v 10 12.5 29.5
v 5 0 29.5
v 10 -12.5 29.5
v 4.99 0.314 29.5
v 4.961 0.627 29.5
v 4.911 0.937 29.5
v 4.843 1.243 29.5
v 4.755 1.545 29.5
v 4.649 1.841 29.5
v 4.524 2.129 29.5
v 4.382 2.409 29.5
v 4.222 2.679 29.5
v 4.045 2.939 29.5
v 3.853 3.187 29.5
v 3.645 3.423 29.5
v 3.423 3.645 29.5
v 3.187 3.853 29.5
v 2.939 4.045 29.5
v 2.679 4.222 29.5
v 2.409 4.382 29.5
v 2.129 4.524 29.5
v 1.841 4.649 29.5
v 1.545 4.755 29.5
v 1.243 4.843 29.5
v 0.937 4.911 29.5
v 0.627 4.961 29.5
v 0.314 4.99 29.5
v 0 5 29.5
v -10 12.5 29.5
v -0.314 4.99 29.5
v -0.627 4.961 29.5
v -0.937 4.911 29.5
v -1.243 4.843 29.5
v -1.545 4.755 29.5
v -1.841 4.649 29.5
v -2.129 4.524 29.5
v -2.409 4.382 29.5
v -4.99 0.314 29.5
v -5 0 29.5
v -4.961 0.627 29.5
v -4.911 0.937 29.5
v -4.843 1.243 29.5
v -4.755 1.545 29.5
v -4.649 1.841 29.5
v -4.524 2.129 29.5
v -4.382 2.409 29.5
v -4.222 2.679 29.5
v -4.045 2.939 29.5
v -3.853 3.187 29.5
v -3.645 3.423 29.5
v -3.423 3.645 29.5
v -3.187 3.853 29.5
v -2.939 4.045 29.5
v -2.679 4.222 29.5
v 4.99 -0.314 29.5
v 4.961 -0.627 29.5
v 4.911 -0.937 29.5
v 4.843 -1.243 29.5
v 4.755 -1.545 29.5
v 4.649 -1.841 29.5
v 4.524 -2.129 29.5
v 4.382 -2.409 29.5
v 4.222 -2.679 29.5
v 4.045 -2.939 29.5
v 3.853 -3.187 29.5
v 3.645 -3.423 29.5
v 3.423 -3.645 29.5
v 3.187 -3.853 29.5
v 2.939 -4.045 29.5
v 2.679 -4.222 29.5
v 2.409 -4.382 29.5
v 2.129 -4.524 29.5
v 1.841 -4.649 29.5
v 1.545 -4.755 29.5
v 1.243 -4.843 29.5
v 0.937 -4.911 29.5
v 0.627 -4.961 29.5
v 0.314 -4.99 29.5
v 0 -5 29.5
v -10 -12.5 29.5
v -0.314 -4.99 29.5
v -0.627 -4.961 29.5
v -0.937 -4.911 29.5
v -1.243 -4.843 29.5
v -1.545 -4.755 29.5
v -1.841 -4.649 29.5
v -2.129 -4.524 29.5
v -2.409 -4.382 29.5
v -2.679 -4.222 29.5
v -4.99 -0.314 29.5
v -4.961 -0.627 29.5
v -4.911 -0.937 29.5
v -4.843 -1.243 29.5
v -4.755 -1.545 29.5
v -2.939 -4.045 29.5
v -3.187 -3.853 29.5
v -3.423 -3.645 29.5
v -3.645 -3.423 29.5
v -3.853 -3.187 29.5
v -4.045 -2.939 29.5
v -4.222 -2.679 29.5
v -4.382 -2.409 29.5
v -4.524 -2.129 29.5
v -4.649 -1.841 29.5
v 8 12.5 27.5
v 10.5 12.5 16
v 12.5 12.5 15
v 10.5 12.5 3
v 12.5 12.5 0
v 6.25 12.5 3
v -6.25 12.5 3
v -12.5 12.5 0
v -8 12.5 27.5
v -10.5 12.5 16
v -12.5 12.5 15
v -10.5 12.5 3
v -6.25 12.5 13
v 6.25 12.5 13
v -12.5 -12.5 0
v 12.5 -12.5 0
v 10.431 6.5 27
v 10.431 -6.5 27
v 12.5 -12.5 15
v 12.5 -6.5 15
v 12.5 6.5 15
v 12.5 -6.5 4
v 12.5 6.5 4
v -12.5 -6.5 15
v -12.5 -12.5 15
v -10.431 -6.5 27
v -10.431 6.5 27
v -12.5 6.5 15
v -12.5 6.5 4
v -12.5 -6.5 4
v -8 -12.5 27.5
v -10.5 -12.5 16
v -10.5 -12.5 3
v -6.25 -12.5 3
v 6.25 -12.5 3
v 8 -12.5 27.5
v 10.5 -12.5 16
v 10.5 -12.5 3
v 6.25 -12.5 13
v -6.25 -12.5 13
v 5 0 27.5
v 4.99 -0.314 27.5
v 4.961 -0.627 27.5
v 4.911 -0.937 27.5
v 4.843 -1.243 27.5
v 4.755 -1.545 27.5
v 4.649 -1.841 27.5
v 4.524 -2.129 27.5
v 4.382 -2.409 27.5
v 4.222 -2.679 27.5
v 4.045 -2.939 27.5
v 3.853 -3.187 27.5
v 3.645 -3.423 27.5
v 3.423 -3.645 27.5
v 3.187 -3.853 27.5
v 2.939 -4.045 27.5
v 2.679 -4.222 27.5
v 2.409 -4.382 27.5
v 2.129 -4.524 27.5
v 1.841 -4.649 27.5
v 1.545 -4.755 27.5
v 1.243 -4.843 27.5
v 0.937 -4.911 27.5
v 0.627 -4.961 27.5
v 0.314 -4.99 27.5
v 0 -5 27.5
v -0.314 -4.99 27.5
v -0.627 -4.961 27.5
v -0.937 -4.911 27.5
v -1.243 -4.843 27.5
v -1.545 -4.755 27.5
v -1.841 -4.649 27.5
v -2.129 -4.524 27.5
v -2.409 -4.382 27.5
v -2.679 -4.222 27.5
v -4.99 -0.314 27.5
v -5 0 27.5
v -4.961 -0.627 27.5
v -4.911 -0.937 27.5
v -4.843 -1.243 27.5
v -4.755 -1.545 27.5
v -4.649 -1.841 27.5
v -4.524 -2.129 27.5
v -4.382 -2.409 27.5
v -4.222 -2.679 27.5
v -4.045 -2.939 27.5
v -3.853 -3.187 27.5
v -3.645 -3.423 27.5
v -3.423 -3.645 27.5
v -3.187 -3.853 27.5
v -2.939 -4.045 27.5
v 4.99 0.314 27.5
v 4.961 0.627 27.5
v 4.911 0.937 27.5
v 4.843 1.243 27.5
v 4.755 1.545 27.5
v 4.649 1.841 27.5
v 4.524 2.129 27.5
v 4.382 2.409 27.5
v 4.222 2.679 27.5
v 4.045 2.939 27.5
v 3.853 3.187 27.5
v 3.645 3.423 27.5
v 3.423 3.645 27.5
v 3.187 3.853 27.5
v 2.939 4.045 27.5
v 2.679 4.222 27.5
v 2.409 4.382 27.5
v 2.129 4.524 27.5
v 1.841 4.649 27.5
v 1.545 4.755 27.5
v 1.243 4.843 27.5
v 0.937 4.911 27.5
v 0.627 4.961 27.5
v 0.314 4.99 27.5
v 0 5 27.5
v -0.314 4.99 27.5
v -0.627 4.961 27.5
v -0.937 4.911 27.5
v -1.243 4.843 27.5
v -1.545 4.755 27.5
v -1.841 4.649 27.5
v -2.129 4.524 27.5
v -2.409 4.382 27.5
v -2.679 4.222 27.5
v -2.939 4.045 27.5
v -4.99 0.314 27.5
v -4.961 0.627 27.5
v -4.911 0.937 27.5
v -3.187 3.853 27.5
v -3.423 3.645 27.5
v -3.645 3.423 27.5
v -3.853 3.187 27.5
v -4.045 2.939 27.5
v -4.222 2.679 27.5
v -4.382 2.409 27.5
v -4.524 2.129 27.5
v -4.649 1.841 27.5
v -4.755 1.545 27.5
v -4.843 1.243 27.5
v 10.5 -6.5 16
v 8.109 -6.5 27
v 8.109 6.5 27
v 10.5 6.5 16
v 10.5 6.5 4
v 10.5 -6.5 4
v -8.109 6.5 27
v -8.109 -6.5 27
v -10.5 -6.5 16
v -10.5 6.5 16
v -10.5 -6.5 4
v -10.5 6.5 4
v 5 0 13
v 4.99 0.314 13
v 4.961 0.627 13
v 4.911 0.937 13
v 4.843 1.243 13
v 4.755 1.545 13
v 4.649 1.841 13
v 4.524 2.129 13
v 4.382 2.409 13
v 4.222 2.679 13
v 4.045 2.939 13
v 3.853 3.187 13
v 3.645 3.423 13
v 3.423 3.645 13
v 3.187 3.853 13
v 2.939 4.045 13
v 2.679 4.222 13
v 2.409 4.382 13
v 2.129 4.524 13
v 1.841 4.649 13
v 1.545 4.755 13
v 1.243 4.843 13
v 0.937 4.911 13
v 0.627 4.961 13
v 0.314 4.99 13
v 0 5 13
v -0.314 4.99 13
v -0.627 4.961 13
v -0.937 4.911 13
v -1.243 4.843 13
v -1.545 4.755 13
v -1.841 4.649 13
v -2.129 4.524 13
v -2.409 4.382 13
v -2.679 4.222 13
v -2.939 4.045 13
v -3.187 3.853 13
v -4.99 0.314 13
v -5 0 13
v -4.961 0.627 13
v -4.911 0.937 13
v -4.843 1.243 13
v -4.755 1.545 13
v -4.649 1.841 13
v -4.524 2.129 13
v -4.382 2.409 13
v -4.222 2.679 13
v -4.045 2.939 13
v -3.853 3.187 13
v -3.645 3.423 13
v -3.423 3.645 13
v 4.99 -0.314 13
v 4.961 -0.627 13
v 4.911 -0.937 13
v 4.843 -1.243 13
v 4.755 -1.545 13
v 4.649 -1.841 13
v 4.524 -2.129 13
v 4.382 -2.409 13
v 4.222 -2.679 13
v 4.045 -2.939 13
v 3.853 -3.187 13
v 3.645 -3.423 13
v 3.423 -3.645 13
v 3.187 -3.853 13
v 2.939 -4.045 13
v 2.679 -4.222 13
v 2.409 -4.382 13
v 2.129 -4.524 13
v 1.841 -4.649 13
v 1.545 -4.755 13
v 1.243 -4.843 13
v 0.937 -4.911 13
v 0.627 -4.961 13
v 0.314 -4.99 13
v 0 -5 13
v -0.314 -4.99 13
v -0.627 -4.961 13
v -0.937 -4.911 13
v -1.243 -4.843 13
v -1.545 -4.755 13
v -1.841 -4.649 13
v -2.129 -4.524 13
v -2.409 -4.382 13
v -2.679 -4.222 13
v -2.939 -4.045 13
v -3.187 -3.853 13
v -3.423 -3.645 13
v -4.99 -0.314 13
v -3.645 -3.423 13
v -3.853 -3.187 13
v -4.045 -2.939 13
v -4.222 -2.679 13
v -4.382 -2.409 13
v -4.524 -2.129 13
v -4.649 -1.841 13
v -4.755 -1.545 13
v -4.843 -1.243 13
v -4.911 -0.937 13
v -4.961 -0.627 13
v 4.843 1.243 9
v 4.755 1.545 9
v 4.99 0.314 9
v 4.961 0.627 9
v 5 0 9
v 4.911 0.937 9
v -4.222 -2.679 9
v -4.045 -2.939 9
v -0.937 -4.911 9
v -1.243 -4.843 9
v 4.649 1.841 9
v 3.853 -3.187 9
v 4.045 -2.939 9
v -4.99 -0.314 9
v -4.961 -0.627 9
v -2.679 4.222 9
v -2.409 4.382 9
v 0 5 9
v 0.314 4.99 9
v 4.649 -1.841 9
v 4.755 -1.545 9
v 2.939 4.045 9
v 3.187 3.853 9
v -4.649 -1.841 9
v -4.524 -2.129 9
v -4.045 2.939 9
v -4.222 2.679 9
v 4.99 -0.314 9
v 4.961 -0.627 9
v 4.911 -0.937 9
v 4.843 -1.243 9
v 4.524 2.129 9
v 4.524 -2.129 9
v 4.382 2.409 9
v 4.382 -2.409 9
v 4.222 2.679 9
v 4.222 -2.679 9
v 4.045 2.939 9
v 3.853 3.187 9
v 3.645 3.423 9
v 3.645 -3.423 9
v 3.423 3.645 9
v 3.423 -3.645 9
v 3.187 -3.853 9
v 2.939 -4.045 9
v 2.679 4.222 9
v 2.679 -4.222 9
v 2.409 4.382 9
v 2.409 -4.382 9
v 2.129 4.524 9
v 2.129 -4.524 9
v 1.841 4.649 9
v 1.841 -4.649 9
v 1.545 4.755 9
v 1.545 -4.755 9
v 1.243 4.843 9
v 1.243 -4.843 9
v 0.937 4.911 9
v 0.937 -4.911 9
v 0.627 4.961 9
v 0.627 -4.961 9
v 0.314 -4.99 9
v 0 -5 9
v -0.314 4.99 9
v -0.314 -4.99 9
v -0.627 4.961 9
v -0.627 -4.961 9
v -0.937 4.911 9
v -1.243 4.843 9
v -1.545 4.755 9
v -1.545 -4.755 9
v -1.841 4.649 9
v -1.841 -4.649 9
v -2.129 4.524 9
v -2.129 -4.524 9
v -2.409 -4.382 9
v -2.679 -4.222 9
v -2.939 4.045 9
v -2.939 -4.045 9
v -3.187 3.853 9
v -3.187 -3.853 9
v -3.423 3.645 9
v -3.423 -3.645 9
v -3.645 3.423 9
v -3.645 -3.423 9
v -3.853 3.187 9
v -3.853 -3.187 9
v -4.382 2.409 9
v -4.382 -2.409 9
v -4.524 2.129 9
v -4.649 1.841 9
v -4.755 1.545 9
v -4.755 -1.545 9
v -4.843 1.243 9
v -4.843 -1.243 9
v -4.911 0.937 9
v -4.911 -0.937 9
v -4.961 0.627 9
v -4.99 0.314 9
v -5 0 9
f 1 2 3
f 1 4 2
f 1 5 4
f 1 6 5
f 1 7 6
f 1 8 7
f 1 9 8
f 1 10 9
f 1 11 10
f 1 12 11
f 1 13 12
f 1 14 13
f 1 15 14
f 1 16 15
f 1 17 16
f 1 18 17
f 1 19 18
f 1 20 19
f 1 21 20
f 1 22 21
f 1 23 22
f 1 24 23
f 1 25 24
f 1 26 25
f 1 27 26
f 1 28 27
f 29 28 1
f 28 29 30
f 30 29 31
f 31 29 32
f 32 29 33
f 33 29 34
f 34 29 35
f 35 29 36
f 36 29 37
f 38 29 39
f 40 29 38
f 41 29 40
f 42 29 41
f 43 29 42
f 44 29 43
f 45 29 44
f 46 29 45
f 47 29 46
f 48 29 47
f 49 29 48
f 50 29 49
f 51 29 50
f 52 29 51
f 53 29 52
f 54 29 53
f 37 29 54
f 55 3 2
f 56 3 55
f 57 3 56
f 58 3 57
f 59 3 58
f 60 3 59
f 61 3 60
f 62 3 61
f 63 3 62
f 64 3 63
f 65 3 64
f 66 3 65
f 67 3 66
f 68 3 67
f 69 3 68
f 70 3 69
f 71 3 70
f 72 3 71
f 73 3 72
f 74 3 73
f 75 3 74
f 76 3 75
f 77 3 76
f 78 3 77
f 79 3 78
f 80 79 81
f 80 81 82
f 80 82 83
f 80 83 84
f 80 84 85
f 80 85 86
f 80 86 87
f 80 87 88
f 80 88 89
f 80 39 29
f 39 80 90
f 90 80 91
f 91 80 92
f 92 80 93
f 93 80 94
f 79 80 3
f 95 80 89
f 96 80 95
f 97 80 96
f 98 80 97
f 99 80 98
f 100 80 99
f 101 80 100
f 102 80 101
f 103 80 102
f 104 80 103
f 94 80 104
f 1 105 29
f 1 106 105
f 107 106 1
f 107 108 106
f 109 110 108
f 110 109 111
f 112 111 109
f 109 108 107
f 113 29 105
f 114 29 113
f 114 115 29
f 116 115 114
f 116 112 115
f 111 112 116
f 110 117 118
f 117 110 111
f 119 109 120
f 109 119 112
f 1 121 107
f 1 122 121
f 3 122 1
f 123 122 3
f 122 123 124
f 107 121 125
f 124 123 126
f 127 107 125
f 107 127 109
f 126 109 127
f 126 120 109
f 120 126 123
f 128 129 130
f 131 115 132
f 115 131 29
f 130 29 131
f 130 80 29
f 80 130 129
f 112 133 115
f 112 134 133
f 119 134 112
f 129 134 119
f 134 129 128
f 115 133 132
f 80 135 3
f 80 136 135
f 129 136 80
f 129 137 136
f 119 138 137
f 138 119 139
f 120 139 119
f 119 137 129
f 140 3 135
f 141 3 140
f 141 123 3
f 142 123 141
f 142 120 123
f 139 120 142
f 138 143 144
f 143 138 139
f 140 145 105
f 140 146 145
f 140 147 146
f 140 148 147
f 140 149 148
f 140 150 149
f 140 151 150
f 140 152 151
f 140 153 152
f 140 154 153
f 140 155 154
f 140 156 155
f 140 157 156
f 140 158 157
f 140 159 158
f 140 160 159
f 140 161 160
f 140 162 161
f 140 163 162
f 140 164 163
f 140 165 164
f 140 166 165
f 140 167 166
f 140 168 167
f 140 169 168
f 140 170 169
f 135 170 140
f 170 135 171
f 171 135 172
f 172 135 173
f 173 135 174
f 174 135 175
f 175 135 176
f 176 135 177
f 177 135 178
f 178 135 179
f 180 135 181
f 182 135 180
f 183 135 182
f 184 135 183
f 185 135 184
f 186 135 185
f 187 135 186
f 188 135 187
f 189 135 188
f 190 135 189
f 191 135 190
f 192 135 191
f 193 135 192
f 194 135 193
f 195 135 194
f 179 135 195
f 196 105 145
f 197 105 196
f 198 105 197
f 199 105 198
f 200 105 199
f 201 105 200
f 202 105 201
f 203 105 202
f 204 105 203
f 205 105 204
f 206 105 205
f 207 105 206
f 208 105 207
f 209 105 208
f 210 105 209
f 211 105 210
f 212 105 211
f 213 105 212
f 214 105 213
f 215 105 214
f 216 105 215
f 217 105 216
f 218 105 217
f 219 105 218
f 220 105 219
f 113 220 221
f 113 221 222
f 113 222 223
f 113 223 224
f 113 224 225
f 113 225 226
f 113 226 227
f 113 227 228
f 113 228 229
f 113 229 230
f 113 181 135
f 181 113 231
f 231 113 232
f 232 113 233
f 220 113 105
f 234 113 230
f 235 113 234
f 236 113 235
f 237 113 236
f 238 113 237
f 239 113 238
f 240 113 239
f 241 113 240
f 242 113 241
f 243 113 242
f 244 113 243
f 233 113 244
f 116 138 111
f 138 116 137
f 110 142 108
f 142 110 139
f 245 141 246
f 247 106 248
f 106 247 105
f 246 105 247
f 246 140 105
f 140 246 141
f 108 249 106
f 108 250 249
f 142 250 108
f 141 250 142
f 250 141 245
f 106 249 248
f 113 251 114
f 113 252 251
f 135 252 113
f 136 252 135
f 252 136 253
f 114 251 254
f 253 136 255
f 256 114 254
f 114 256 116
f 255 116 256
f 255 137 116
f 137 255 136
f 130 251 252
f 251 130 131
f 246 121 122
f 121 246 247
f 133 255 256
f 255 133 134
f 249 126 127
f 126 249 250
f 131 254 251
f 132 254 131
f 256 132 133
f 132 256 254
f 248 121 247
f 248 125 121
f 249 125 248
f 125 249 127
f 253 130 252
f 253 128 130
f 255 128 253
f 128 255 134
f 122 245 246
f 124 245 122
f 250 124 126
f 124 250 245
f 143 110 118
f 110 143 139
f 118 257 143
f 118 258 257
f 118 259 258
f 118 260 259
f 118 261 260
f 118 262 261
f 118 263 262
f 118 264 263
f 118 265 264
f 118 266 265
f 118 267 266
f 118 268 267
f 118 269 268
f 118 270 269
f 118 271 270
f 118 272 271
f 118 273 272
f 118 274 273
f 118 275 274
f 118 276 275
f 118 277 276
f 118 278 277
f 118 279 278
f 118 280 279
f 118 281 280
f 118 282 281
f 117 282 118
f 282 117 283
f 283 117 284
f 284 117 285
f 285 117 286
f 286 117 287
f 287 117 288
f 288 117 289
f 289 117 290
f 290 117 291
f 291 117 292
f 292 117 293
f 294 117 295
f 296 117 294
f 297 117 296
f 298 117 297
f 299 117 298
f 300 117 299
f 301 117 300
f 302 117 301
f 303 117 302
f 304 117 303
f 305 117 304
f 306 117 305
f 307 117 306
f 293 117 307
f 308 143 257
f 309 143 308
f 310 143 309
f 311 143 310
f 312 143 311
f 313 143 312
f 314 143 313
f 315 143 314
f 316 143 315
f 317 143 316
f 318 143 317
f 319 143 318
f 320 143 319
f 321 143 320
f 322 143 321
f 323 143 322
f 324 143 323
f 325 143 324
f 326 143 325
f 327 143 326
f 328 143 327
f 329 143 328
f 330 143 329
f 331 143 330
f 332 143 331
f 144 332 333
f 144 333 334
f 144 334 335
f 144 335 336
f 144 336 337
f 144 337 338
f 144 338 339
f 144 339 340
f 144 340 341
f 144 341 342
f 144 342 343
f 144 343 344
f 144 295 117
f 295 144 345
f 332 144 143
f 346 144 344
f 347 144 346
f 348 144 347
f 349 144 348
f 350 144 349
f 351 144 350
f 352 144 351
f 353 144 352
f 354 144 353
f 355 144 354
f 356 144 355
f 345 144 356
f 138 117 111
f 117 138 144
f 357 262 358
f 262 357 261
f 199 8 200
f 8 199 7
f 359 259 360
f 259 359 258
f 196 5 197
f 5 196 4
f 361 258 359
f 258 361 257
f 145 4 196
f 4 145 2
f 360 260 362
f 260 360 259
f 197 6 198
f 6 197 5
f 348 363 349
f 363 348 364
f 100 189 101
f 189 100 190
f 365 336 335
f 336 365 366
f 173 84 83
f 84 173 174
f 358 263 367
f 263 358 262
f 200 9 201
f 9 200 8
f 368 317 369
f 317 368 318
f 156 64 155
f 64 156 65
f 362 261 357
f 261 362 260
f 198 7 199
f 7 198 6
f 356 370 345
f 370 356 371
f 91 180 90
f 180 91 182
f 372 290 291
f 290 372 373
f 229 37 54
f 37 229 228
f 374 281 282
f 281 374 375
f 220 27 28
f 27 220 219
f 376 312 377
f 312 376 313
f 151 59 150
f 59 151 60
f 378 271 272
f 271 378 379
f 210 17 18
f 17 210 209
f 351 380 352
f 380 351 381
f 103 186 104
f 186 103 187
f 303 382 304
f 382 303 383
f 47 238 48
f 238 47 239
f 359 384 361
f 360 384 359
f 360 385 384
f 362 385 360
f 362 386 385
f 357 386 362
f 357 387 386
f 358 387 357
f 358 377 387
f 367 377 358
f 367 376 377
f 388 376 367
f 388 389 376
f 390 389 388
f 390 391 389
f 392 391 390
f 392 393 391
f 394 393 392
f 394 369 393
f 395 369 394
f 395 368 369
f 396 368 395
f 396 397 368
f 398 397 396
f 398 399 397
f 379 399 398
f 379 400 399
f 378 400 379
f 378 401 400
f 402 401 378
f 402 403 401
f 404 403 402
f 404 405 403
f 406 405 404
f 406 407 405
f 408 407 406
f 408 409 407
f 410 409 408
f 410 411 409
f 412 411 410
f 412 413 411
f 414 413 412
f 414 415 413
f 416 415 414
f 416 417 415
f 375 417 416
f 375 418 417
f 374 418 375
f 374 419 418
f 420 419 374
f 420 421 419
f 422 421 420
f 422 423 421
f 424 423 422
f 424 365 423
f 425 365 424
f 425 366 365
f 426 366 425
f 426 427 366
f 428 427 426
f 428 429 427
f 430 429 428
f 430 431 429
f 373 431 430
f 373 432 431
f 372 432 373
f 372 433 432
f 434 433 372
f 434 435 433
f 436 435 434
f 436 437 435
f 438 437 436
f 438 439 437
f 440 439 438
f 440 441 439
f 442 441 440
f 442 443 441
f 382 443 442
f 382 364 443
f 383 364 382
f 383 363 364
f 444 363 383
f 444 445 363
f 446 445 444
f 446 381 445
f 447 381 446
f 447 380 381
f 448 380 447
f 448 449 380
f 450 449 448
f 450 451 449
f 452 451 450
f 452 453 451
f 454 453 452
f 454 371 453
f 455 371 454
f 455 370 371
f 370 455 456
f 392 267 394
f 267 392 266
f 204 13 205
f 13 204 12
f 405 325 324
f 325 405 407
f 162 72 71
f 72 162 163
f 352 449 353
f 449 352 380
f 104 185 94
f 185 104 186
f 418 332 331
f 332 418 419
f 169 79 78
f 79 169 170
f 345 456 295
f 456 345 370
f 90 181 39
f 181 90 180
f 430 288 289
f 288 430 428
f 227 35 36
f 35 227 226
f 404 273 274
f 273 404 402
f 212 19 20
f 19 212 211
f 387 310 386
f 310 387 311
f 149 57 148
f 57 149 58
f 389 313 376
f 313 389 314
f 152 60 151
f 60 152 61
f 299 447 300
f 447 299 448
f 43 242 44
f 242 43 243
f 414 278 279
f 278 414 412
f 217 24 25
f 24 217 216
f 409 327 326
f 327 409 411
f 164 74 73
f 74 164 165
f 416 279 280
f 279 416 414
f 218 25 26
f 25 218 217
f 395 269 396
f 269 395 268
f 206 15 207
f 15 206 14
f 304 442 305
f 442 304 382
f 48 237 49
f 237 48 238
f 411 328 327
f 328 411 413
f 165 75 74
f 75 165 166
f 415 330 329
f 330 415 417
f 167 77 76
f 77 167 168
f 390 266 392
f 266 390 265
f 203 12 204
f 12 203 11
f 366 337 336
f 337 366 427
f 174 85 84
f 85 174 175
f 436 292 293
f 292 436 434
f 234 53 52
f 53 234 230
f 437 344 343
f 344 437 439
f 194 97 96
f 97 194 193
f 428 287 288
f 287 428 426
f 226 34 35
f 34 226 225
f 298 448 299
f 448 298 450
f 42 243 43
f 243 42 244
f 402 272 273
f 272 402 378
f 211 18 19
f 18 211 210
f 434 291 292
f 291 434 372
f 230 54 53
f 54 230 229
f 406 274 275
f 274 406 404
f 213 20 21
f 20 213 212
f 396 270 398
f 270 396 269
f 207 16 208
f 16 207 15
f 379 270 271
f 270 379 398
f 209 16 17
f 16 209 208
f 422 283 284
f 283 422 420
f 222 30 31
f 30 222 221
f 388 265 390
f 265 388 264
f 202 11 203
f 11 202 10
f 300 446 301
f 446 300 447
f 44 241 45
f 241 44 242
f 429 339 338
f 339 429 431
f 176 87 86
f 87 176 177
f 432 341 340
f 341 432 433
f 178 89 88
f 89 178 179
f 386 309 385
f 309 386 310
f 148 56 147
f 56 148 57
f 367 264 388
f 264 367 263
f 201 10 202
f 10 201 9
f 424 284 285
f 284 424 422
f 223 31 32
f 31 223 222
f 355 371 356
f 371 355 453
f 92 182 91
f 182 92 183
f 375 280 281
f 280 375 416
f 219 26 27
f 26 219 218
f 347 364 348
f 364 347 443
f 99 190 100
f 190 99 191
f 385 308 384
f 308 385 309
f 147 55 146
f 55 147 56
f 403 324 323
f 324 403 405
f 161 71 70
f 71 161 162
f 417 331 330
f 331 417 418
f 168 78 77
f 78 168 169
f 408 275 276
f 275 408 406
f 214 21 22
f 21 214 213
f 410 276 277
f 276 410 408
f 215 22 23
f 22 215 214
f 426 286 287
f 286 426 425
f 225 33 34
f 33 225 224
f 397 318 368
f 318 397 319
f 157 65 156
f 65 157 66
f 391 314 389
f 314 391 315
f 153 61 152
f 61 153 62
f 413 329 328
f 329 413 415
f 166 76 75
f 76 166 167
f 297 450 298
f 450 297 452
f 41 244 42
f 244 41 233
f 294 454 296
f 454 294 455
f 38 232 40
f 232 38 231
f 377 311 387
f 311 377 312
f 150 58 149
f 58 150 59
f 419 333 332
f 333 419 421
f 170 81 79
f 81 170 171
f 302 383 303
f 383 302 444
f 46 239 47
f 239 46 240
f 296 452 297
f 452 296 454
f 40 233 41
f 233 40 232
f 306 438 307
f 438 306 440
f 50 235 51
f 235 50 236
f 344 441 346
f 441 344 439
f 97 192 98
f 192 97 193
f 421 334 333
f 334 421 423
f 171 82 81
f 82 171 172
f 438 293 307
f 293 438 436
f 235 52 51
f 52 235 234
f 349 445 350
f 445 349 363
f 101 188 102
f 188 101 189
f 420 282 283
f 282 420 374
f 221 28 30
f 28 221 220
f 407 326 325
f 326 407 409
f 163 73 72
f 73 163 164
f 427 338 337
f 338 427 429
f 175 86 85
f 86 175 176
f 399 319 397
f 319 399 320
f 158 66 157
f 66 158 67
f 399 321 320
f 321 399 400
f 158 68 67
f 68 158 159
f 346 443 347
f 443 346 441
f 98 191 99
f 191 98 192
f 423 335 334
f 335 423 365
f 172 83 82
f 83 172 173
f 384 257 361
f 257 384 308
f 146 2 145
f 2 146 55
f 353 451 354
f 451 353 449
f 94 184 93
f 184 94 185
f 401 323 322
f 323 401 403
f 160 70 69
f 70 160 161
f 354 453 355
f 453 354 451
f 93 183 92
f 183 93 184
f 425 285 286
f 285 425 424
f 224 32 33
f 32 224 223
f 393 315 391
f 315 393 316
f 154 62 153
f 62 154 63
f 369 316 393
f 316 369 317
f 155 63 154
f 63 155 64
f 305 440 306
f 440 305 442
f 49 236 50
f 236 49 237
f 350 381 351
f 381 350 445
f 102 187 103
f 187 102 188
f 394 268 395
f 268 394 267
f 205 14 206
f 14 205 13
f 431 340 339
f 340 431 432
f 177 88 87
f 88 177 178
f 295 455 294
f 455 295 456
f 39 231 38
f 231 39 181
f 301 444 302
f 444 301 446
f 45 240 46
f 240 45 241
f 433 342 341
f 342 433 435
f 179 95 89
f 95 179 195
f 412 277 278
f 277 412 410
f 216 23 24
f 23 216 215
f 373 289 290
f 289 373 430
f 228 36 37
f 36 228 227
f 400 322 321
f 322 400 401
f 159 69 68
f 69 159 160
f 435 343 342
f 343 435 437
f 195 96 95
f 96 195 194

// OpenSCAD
$fn = 100;  //set high quality render

body_core_height = 15;
body_width = 25;
body_length = 25;
body_taper_width = 20;
body_taper_length = 25;
body_taper_offset = 20;
body_thickness = 4;

tube_radius = 10/2;
tube_length = 30;

module body(){
    difference() {
        union(){
        difference(){
            hull(){
                //main body
                translate([0,0,body_core_height/2])cube([body_width, body_length, body_core_height], center=true);
                //top extension
                translate([0,0,body_taper_offset + body_core_height/2]) cube([body_taper_width, body_taper_length, body_thickness], center=true);
            }
            //subtract the inner core
            hull(){
                translate([0,0,body_core_height/2 + body_thickness/2]) cube([body_width-body_thickness, body_length+1, body_core_height-body_thickness/2], center=true);
                translate([0,0,body_taper_offset + body_core_height/2 - body_thickness/2]) cube([body_taper_width-body_thickness, body_taper_length+1, body_thickness], center=true);
            }
            //side cut
            translate([0,0,body_core_height/2+ body_thickness*2]) cube([body_width+1, body_taper_length-body_thickness*3, body_core_height+body_taper_offset-body_thickness*3], center=true);
        }
        //add tube base
        translate([0,0,body_core_height/2])
        cube([body_width/2, body_length, body_core_height-body_thickness], center=true);
        }
        //top tube cut
        translate([0,0,body_taper_offset + body_thickness])
        cylinder(h = tube_length, r = tube_radius, center=true);
    }
}

module tube_holder(){}

module interface(){}

body();
